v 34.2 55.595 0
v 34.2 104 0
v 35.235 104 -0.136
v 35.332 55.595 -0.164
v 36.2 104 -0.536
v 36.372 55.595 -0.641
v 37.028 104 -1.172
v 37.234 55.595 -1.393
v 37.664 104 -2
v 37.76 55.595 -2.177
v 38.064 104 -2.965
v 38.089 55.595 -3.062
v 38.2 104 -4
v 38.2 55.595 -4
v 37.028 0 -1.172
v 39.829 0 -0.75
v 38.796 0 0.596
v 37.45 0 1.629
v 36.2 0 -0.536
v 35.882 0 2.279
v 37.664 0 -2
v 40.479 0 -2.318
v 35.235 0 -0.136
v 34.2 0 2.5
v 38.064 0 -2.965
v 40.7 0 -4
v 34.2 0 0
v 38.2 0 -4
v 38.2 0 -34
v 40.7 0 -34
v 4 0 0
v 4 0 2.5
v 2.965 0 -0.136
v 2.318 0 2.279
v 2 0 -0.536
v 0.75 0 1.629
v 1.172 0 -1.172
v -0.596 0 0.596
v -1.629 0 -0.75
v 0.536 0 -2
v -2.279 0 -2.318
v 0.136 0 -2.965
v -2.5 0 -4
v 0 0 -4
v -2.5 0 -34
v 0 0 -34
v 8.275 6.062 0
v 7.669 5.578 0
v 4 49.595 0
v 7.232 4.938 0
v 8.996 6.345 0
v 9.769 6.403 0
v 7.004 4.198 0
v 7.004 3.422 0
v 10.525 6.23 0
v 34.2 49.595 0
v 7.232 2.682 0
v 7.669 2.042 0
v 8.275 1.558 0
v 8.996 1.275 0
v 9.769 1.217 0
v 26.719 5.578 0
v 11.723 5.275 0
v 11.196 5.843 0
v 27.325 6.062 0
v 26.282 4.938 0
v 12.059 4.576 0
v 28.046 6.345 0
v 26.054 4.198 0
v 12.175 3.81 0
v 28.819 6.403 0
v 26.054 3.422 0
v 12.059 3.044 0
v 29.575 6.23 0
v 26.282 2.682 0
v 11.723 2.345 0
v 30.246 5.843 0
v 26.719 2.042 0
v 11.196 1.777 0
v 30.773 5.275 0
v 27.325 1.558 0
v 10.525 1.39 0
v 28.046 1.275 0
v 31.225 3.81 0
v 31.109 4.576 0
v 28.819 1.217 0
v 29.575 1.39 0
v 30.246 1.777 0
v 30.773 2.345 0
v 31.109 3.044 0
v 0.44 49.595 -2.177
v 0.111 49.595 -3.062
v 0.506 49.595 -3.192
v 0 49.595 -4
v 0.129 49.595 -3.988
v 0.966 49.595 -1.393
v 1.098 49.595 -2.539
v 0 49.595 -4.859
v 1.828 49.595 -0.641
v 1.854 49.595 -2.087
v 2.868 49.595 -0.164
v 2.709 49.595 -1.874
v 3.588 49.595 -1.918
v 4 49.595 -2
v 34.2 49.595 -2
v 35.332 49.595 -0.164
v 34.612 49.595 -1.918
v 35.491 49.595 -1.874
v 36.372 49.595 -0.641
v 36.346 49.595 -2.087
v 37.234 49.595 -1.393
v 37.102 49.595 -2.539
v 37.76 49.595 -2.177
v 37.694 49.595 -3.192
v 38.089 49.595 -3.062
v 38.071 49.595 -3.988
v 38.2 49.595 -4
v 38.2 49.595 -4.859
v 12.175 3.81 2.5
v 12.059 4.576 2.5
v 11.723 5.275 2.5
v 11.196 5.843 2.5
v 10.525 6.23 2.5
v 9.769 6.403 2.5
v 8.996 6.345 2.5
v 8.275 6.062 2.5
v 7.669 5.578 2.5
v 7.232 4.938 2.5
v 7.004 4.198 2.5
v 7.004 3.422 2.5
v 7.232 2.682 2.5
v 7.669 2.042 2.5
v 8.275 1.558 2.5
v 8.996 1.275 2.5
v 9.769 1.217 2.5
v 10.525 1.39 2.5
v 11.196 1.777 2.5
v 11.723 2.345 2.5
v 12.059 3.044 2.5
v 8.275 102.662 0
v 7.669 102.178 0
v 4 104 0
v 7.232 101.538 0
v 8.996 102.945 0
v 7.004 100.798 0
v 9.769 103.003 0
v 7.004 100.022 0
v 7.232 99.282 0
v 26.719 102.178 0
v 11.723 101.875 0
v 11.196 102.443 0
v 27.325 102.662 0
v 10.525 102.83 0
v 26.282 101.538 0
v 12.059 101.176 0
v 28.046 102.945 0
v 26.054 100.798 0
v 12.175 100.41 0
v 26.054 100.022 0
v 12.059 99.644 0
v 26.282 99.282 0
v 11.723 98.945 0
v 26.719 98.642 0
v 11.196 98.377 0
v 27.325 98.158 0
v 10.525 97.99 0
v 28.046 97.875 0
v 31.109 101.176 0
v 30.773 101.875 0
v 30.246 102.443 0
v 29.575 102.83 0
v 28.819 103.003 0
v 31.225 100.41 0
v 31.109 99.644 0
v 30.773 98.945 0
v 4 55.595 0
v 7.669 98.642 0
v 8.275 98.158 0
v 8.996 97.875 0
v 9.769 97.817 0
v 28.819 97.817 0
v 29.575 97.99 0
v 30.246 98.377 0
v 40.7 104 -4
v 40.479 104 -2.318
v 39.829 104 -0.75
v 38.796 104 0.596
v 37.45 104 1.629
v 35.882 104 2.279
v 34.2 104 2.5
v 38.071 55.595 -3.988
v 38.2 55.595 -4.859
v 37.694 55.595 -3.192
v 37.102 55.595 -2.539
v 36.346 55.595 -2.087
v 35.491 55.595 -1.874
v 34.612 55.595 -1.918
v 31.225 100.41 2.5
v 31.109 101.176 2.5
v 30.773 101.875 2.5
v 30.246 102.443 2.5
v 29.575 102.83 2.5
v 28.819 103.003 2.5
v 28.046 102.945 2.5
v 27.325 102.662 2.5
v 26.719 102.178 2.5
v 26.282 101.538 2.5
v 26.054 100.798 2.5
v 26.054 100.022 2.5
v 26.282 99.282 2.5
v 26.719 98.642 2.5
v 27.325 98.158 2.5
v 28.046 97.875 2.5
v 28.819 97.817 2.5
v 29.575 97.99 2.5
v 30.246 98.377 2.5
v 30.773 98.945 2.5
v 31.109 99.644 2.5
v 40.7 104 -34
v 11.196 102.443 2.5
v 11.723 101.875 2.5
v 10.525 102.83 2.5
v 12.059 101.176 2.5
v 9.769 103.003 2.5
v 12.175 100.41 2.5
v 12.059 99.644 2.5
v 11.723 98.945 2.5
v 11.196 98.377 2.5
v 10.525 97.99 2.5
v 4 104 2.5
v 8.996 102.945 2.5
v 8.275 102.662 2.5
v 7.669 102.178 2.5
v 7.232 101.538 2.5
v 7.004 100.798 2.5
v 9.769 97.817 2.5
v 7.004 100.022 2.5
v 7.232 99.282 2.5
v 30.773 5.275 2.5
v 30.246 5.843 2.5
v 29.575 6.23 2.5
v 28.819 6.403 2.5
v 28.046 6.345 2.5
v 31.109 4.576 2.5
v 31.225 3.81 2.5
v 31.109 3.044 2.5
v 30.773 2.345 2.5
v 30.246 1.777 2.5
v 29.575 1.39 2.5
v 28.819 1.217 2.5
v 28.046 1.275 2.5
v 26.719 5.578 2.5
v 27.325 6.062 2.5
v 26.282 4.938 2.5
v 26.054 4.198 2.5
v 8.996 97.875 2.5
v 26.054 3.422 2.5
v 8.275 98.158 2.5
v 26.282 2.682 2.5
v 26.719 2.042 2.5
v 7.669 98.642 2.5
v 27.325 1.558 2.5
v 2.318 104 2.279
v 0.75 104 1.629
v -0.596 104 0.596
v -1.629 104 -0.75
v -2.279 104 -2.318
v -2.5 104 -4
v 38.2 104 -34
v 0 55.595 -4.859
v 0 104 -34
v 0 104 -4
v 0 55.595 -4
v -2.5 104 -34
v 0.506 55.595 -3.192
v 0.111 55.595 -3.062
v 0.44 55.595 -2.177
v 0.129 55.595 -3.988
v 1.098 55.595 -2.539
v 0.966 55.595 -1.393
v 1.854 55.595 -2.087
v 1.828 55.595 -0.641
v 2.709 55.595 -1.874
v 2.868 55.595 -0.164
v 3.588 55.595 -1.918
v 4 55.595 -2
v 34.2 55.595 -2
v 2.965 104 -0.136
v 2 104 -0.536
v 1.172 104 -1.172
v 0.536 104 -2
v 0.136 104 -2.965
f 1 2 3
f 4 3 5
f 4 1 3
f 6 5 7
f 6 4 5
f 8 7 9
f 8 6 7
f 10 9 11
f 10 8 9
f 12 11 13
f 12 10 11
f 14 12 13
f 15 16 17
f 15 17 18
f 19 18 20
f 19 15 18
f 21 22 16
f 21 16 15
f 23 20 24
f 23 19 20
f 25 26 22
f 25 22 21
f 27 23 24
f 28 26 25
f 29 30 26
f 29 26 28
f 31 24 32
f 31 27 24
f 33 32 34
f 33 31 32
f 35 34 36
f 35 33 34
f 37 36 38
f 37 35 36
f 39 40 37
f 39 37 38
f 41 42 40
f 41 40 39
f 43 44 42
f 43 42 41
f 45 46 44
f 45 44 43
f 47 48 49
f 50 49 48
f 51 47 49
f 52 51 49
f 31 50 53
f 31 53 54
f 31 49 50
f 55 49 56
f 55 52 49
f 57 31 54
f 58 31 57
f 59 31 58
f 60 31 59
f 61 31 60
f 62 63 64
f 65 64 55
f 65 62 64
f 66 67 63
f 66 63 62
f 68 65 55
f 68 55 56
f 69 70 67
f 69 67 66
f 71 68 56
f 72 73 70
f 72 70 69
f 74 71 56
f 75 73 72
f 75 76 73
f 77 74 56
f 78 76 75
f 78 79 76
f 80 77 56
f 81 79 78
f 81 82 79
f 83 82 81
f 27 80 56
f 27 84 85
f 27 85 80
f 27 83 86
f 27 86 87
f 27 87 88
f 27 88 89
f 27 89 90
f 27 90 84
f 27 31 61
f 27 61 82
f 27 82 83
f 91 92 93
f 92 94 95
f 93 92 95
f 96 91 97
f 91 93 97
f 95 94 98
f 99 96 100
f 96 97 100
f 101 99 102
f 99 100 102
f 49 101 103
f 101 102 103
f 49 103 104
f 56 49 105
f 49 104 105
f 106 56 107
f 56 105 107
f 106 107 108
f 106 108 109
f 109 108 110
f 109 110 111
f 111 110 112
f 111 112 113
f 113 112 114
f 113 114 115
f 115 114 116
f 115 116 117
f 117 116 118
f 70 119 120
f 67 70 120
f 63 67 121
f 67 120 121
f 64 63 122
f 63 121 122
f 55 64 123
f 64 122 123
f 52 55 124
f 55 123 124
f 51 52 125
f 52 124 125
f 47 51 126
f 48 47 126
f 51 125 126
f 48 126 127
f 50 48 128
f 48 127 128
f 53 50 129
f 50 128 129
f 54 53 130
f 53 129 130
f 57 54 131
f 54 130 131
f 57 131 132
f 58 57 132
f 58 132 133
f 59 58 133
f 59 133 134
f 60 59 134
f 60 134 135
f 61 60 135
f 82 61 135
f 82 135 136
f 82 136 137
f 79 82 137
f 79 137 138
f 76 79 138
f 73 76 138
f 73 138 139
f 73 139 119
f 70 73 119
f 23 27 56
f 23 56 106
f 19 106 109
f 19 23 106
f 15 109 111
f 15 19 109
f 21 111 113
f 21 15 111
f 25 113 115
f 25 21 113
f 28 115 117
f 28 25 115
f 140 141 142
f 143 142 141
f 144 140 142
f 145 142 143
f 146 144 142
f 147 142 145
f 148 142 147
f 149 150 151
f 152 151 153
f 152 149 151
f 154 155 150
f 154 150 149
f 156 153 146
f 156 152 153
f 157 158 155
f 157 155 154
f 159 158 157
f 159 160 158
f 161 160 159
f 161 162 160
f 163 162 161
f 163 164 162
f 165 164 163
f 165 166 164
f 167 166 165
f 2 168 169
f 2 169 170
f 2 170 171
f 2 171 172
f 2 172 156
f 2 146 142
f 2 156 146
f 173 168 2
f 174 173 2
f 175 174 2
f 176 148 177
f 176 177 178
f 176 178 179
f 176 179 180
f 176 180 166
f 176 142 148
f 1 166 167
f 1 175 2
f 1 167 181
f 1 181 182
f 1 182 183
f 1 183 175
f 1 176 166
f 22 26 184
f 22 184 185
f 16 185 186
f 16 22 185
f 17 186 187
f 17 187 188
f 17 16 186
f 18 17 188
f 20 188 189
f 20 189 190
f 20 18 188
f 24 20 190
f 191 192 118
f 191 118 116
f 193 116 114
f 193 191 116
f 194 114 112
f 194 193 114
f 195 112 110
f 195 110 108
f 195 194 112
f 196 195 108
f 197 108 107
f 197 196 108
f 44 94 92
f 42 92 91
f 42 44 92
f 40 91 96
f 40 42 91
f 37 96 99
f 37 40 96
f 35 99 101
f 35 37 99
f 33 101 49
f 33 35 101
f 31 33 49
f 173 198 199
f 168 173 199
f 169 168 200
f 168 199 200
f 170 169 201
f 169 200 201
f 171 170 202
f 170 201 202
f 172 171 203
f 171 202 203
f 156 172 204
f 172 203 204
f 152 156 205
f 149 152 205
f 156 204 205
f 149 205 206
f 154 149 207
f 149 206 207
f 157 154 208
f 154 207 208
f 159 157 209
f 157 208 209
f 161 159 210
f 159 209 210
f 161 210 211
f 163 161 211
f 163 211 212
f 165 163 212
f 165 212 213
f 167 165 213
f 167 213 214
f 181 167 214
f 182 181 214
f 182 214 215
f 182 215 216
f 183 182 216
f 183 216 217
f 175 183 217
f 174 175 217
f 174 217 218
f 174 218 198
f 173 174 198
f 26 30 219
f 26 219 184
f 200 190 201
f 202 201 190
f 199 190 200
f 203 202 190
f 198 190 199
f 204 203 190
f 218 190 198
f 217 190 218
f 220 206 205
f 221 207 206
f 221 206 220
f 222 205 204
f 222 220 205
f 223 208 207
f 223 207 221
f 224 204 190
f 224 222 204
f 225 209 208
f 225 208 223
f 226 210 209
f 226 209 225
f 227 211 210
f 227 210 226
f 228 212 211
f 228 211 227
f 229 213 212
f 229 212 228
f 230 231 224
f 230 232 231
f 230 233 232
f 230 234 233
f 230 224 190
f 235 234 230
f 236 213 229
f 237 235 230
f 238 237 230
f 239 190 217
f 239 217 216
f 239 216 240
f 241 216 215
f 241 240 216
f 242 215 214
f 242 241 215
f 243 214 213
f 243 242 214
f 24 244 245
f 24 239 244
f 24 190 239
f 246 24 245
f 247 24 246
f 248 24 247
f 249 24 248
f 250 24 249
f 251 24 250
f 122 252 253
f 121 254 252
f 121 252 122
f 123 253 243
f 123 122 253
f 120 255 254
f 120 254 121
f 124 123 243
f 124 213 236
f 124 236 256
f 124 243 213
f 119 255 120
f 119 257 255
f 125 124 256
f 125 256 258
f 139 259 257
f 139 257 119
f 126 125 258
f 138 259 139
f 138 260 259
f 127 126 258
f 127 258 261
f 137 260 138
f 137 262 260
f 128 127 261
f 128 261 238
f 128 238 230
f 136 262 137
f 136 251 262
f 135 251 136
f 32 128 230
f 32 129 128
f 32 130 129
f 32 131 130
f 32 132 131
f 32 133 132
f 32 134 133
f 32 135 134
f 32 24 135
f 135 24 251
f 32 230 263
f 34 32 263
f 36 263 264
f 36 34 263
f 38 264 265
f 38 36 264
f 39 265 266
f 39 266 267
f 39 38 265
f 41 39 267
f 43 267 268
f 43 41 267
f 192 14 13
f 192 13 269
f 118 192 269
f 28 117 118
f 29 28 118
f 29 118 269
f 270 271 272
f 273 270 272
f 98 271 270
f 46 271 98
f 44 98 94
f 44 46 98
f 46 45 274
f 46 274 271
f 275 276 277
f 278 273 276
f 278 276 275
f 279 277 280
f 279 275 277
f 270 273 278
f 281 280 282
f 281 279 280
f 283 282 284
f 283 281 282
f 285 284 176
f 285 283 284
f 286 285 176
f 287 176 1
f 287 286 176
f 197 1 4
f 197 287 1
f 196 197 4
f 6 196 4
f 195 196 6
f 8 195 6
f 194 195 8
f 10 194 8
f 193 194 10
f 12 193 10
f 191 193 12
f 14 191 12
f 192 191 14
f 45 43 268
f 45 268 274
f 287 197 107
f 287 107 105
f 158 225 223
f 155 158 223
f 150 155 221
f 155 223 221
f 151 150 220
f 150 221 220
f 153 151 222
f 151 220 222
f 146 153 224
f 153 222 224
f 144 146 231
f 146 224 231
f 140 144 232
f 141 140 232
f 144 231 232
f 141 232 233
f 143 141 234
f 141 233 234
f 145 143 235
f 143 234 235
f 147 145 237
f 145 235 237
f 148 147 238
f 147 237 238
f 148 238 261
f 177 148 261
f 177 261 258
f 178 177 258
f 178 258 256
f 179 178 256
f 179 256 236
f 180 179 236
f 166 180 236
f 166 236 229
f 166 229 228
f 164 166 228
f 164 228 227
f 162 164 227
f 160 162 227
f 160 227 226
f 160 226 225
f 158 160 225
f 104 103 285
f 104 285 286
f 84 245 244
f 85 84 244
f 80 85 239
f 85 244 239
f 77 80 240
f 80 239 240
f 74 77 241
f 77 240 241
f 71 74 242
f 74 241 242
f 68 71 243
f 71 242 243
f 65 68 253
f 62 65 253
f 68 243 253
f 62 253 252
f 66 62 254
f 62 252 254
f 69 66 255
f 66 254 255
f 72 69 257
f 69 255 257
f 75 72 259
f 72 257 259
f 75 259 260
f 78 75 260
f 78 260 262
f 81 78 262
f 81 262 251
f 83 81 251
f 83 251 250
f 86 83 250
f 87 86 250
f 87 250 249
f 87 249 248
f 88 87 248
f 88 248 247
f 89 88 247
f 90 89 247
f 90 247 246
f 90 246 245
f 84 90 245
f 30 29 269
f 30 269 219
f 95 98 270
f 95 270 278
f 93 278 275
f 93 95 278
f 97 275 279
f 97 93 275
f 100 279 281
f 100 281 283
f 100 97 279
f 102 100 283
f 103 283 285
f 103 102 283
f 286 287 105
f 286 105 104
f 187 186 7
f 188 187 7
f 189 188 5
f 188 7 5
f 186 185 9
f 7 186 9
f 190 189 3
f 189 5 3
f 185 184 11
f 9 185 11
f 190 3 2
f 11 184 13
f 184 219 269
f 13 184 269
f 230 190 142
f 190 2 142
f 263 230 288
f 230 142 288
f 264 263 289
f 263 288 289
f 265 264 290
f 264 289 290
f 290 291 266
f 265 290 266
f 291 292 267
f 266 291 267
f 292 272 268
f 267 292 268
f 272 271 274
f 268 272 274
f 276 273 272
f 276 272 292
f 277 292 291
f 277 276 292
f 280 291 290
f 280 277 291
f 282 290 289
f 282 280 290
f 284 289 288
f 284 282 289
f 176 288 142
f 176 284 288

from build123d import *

# Parameters (mm, degrees)
BOSS_EXTRUDE1_DEPTH = 104
SKETCH2_R           = 2.6
CUT_EXTRUDE1_DEPTH  = 108
SKETCH3_W           = 30.2
SKETCH3_H           = 6
BOSS_EXTRUDE2_DEPTH = 2
CHAMFER1_SIZE       = 2
FILLET1_R           = 3


with BuildPart() as part:
    # Sketch1 → Boss-Extrude1 (new body)
    with BuildSketch(Plane(origin=(0, 0, 0), x_dir=(1, 0, 0), z_dir=(0, 1, 0))):
        with BuildLine():
            Line((4, 0), (34.2, 0))
            ThreePointArc((34.2, 0), (37.028427125, 1.171572875), (38.2, 4))
            Line((38.2, 4), (38.2, 34))
            Line((38.2, 34), (40.7, 34))
            Line((40.7, 34), (40.7, 4))
            ThreePointArc((40.7, 4), (38.796194078, -0.596194078), (34.2, -2.5))
            Line((34.2, -2.5), (4, -2.5))
            ThreePointArc((4, -2.5), (-0.596194078, -0.596194078), (-2.5, 4))
            Line((-2.5, 4), (-2.5, 34))
            Line((-2.5, 34), (0, 34))
            Line((0, 34), (0, 4))
            ThreePointArc((0, 4), (1.171572875, 1.171572875), (4, 0))
        make_face()
    extrude(amount=BOSS_EXTRUDE1_DEPTH)

    # Sketch2 → Cut-Extrude1 (cut)
    with BuildSketch(Plane.XY.offset(2.5)):
        with Locations((9.575, 3.81)):
            Circle(SKETCH2_R)
        with Locations((28.625, 3.81)):
            Circle(SKETCH2_R)
        with Locations((9.575, 100.41)):
            Circle(SKETCH2_R)
        with Locations((28.625, 100.41)):
            Circle(SKETCH2_R)
    extrude(amount=-CUT_EXTRUDE1_DEPTH, mode=Mode.SUBTRACT)

    # Sketch3 → Boss-Extrude2 (add)
    with BuildSketch(Plane(origin=(0, 0, 0), x_dir=(-1, 0, 0), z_dir=(0, 0, -1))):
        with Locations((-19.1, 52.595312466)):
            Rectangle(SKETCH3_W, SKETCH3_H)
    extrude(amount=BOSS_EXTRUDE2_DEPTH)

    # Chamfer1
    # the kernel refuses this chamfer: 10, 2 mm, written as the material it adds along each edge
    with BuildSketch(Plane(origin=(34.2, 55.595312466, 0), x_dir=(0.908761807760111, 0, -0.41731520072551287), z_dir=(0, -1, 0))) as chamfer1_piece_1_section:
        with BuildLine():
            Line((3.338521606, 0), (CHAMFER1_SIZE * 0.417315200726, -CHAMFER1_SIZE * 0.90876180776))
            Line((CHAMFER1_SIZE * 0.417315200726, -CHAMFER1_SIZE * 0.90876180776), (0, 0))
            ThreePointArc((0, 0), (1.841628656, 0.361237209), (3.338521606, 0))
        make_face()
    chamfer1_piece_1 = extrude(amount=6, mode=Mode.PRIVATE)
    chamfer1_piece_1 = split(chamfer1_piece_1, bisect_by=Plane(origin=(34.2, 55.595312466, -2), z_dir=(0, 0, 1)), keep=Keep.TOP, mode=Mode.PRIVATE)
    add(chamfer1_piece_1)
    with BuildSketch(Plane(origin=(4, 49.595312466, 0), x_dir=(-0.9087618077601108, 0, -0.41731520072551315), z_dir=(0, 1, 0))) as chamfer1_piece_2_section:
        with BuildLine():
            Line((3.338521606, 0), (CHAMFER1_SIZE * 0.417315200726, -CHAMFER1_SIZE * 0.90876180776))
            Line((CHAMFER1_SIZE * 0.417315200726, -CHAMFER1_SIZE * 0.90876180776), (0, 0))
            ThreePointArc((0, 0), (1.841628656, 0.361237209), (3.338521606, 0))
        make_face()
    chamfer1_piece_2 = extrude(amount=6, mode=Mode.PRIVATE)
    chamfer1_piece_2 = split(chamfer1_piece_2, bisect_by=Plane(origin=(4, 49.595312466, -2), z_dir=(0, 0, 1)), keep=Keep.TOP, mode=Mode.PRIVATE)
    add(chamfer1_piece_2)

    # Fillet1
    # the kernel refuses this fillet: 3 mm, written as the material it adds along each edge
    with BuildSketch(Plane(origin=(37.23392093, 55.595312466, -1.393215814), x_dir=(-0.9805806756909838, 0, -0.1961161351378653), z_dir=(0, -1, 0)), Plane(origin=(0.96607907, 49.595312466, -1.393215814), x_dir=(0.9805806756909838, 0, -0.19611613513786538), z_dir=(0, 1, 0))) as fillet1_piece_1:
        with BuildLine():
            CenterArc((2.674200502, 3), FILLET1_R, 168.690067526, 101.309932474)
            Line((-0.267541525, 3.588348405), (-0.561715728, 3.647183246))
            ThreePointArc((-0.561715728, 3.647183246), (-0.730260231, 2.804460732), (-0.261467751, -0.147087101))
            Line((-0.261467751, -0.147087101), (0, -0.3))
            Line((0, -0.3), (2.674200502, -0.3))
            Line((2.674200502, -0.3), (2.674200502, 0))
        make_face()
    extrude(amount=6)


solid = part.part
